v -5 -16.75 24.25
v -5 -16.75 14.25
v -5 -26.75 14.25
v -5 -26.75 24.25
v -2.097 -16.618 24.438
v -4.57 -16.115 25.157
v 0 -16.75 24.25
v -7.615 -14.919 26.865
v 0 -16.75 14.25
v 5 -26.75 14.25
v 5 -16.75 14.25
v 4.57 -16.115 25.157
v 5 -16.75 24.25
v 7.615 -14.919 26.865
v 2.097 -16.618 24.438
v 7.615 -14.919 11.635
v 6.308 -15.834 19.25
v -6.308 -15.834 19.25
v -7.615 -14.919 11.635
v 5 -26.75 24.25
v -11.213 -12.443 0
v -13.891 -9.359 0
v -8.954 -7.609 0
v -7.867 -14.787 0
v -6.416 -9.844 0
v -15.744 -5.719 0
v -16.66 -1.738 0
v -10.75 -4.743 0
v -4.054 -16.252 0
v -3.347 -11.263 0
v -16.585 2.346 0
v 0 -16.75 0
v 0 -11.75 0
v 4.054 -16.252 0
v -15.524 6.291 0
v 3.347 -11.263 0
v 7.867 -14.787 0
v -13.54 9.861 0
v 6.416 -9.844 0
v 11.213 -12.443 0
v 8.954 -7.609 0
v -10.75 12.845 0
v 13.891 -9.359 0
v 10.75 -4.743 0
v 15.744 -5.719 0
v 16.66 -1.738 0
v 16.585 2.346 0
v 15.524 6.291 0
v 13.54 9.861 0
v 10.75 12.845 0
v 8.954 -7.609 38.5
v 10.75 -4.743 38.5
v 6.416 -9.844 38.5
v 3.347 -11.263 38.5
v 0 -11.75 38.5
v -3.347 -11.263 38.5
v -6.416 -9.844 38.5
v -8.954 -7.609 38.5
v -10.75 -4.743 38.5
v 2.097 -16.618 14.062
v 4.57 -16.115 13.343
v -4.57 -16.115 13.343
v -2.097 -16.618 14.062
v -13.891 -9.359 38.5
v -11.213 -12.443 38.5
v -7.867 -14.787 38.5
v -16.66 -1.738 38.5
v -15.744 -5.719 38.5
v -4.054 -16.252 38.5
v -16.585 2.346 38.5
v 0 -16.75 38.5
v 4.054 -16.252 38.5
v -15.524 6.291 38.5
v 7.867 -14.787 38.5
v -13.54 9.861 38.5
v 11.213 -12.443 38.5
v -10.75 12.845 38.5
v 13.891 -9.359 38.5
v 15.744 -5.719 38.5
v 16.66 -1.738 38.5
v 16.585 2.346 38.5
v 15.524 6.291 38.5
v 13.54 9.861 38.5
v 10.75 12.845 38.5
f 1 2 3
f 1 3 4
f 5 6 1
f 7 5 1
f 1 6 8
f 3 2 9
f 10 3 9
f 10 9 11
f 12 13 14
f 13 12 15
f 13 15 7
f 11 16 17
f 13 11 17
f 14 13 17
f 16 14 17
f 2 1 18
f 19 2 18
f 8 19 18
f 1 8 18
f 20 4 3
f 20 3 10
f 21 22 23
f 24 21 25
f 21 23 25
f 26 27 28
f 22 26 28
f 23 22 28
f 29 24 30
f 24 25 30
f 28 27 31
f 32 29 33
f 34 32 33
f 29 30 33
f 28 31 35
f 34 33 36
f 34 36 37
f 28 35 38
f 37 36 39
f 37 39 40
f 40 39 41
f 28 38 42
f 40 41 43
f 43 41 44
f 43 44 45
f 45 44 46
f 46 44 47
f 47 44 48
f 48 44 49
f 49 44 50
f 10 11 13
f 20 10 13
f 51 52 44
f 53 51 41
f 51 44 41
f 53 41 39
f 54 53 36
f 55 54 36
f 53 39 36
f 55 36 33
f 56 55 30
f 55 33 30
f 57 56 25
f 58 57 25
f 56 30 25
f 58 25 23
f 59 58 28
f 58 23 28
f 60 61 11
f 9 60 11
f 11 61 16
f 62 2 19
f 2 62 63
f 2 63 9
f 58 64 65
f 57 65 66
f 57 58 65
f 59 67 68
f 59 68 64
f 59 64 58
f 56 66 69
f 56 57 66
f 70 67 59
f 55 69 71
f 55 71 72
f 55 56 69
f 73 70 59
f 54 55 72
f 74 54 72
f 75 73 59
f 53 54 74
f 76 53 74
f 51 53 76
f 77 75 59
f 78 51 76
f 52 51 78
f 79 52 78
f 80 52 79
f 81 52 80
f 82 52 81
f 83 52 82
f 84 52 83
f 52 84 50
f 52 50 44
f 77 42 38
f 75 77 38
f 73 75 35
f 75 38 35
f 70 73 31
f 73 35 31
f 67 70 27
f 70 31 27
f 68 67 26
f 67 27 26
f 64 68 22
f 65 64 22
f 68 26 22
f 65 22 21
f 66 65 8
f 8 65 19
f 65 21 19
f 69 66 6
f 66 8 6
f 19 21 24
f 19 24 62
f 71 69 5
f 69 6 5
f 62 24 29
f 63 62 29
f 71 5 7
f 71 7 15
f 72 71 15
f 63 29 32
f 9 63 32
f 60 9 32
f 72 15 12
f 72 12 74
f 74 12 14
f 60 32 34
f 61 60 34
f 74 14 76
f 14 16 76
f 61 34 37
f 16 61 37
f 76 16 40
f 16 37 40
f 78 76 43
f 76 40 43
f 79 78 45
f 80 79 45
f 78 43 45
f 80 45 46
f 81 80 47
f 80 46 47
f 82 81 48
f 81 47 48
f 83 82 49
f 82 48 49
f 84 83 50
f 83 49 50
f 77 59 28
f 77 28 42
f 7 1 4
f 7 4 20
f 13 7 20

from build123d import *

# Parameters (mm, degrees)
F1_DEPTH      = 38.5
F3_W          = 10
F3_H          = 10
F4_DEPTH      = 10
F4_DEPTH_BACK = 4
F4_TAPER_BACK = -55


with BuildPart() as f1:
    # F0 (on Top) → F1 (new body)
    with BuildSketch(Plane.XY):
        with BuildLine():
            ThreePointArc((10.75, -4.7434164903), (0, -11.75), (-10.75, -4.7434164903))
            Line((-10.75, -4.7434164903), (-10.75, 12.8452325787))
            ThreePointArc((-10.75, 12.8452325787), (0, -16.75), (10.75, 12.8452325787))
            Line((10.75, 12.8452325787), (10.75, -4.7434164903))
        make_face()
    extrude(amount=F1_DEPTH)

    # F3 (on offset) → F4 (join, two sides)
    with BuildSketch(Plane.XZ.offset(16.75)) as f4_sk:
        with Locations((0, 19.25)):
            Rectangle(F3_W, F3_H)
    extrude(amount=F4_DEPTH)
    extrude(f4_sk.sketch, amount=-F4_DEPTH_BACK, taper=F4_TAPER_BACK)


solid = f1.part
